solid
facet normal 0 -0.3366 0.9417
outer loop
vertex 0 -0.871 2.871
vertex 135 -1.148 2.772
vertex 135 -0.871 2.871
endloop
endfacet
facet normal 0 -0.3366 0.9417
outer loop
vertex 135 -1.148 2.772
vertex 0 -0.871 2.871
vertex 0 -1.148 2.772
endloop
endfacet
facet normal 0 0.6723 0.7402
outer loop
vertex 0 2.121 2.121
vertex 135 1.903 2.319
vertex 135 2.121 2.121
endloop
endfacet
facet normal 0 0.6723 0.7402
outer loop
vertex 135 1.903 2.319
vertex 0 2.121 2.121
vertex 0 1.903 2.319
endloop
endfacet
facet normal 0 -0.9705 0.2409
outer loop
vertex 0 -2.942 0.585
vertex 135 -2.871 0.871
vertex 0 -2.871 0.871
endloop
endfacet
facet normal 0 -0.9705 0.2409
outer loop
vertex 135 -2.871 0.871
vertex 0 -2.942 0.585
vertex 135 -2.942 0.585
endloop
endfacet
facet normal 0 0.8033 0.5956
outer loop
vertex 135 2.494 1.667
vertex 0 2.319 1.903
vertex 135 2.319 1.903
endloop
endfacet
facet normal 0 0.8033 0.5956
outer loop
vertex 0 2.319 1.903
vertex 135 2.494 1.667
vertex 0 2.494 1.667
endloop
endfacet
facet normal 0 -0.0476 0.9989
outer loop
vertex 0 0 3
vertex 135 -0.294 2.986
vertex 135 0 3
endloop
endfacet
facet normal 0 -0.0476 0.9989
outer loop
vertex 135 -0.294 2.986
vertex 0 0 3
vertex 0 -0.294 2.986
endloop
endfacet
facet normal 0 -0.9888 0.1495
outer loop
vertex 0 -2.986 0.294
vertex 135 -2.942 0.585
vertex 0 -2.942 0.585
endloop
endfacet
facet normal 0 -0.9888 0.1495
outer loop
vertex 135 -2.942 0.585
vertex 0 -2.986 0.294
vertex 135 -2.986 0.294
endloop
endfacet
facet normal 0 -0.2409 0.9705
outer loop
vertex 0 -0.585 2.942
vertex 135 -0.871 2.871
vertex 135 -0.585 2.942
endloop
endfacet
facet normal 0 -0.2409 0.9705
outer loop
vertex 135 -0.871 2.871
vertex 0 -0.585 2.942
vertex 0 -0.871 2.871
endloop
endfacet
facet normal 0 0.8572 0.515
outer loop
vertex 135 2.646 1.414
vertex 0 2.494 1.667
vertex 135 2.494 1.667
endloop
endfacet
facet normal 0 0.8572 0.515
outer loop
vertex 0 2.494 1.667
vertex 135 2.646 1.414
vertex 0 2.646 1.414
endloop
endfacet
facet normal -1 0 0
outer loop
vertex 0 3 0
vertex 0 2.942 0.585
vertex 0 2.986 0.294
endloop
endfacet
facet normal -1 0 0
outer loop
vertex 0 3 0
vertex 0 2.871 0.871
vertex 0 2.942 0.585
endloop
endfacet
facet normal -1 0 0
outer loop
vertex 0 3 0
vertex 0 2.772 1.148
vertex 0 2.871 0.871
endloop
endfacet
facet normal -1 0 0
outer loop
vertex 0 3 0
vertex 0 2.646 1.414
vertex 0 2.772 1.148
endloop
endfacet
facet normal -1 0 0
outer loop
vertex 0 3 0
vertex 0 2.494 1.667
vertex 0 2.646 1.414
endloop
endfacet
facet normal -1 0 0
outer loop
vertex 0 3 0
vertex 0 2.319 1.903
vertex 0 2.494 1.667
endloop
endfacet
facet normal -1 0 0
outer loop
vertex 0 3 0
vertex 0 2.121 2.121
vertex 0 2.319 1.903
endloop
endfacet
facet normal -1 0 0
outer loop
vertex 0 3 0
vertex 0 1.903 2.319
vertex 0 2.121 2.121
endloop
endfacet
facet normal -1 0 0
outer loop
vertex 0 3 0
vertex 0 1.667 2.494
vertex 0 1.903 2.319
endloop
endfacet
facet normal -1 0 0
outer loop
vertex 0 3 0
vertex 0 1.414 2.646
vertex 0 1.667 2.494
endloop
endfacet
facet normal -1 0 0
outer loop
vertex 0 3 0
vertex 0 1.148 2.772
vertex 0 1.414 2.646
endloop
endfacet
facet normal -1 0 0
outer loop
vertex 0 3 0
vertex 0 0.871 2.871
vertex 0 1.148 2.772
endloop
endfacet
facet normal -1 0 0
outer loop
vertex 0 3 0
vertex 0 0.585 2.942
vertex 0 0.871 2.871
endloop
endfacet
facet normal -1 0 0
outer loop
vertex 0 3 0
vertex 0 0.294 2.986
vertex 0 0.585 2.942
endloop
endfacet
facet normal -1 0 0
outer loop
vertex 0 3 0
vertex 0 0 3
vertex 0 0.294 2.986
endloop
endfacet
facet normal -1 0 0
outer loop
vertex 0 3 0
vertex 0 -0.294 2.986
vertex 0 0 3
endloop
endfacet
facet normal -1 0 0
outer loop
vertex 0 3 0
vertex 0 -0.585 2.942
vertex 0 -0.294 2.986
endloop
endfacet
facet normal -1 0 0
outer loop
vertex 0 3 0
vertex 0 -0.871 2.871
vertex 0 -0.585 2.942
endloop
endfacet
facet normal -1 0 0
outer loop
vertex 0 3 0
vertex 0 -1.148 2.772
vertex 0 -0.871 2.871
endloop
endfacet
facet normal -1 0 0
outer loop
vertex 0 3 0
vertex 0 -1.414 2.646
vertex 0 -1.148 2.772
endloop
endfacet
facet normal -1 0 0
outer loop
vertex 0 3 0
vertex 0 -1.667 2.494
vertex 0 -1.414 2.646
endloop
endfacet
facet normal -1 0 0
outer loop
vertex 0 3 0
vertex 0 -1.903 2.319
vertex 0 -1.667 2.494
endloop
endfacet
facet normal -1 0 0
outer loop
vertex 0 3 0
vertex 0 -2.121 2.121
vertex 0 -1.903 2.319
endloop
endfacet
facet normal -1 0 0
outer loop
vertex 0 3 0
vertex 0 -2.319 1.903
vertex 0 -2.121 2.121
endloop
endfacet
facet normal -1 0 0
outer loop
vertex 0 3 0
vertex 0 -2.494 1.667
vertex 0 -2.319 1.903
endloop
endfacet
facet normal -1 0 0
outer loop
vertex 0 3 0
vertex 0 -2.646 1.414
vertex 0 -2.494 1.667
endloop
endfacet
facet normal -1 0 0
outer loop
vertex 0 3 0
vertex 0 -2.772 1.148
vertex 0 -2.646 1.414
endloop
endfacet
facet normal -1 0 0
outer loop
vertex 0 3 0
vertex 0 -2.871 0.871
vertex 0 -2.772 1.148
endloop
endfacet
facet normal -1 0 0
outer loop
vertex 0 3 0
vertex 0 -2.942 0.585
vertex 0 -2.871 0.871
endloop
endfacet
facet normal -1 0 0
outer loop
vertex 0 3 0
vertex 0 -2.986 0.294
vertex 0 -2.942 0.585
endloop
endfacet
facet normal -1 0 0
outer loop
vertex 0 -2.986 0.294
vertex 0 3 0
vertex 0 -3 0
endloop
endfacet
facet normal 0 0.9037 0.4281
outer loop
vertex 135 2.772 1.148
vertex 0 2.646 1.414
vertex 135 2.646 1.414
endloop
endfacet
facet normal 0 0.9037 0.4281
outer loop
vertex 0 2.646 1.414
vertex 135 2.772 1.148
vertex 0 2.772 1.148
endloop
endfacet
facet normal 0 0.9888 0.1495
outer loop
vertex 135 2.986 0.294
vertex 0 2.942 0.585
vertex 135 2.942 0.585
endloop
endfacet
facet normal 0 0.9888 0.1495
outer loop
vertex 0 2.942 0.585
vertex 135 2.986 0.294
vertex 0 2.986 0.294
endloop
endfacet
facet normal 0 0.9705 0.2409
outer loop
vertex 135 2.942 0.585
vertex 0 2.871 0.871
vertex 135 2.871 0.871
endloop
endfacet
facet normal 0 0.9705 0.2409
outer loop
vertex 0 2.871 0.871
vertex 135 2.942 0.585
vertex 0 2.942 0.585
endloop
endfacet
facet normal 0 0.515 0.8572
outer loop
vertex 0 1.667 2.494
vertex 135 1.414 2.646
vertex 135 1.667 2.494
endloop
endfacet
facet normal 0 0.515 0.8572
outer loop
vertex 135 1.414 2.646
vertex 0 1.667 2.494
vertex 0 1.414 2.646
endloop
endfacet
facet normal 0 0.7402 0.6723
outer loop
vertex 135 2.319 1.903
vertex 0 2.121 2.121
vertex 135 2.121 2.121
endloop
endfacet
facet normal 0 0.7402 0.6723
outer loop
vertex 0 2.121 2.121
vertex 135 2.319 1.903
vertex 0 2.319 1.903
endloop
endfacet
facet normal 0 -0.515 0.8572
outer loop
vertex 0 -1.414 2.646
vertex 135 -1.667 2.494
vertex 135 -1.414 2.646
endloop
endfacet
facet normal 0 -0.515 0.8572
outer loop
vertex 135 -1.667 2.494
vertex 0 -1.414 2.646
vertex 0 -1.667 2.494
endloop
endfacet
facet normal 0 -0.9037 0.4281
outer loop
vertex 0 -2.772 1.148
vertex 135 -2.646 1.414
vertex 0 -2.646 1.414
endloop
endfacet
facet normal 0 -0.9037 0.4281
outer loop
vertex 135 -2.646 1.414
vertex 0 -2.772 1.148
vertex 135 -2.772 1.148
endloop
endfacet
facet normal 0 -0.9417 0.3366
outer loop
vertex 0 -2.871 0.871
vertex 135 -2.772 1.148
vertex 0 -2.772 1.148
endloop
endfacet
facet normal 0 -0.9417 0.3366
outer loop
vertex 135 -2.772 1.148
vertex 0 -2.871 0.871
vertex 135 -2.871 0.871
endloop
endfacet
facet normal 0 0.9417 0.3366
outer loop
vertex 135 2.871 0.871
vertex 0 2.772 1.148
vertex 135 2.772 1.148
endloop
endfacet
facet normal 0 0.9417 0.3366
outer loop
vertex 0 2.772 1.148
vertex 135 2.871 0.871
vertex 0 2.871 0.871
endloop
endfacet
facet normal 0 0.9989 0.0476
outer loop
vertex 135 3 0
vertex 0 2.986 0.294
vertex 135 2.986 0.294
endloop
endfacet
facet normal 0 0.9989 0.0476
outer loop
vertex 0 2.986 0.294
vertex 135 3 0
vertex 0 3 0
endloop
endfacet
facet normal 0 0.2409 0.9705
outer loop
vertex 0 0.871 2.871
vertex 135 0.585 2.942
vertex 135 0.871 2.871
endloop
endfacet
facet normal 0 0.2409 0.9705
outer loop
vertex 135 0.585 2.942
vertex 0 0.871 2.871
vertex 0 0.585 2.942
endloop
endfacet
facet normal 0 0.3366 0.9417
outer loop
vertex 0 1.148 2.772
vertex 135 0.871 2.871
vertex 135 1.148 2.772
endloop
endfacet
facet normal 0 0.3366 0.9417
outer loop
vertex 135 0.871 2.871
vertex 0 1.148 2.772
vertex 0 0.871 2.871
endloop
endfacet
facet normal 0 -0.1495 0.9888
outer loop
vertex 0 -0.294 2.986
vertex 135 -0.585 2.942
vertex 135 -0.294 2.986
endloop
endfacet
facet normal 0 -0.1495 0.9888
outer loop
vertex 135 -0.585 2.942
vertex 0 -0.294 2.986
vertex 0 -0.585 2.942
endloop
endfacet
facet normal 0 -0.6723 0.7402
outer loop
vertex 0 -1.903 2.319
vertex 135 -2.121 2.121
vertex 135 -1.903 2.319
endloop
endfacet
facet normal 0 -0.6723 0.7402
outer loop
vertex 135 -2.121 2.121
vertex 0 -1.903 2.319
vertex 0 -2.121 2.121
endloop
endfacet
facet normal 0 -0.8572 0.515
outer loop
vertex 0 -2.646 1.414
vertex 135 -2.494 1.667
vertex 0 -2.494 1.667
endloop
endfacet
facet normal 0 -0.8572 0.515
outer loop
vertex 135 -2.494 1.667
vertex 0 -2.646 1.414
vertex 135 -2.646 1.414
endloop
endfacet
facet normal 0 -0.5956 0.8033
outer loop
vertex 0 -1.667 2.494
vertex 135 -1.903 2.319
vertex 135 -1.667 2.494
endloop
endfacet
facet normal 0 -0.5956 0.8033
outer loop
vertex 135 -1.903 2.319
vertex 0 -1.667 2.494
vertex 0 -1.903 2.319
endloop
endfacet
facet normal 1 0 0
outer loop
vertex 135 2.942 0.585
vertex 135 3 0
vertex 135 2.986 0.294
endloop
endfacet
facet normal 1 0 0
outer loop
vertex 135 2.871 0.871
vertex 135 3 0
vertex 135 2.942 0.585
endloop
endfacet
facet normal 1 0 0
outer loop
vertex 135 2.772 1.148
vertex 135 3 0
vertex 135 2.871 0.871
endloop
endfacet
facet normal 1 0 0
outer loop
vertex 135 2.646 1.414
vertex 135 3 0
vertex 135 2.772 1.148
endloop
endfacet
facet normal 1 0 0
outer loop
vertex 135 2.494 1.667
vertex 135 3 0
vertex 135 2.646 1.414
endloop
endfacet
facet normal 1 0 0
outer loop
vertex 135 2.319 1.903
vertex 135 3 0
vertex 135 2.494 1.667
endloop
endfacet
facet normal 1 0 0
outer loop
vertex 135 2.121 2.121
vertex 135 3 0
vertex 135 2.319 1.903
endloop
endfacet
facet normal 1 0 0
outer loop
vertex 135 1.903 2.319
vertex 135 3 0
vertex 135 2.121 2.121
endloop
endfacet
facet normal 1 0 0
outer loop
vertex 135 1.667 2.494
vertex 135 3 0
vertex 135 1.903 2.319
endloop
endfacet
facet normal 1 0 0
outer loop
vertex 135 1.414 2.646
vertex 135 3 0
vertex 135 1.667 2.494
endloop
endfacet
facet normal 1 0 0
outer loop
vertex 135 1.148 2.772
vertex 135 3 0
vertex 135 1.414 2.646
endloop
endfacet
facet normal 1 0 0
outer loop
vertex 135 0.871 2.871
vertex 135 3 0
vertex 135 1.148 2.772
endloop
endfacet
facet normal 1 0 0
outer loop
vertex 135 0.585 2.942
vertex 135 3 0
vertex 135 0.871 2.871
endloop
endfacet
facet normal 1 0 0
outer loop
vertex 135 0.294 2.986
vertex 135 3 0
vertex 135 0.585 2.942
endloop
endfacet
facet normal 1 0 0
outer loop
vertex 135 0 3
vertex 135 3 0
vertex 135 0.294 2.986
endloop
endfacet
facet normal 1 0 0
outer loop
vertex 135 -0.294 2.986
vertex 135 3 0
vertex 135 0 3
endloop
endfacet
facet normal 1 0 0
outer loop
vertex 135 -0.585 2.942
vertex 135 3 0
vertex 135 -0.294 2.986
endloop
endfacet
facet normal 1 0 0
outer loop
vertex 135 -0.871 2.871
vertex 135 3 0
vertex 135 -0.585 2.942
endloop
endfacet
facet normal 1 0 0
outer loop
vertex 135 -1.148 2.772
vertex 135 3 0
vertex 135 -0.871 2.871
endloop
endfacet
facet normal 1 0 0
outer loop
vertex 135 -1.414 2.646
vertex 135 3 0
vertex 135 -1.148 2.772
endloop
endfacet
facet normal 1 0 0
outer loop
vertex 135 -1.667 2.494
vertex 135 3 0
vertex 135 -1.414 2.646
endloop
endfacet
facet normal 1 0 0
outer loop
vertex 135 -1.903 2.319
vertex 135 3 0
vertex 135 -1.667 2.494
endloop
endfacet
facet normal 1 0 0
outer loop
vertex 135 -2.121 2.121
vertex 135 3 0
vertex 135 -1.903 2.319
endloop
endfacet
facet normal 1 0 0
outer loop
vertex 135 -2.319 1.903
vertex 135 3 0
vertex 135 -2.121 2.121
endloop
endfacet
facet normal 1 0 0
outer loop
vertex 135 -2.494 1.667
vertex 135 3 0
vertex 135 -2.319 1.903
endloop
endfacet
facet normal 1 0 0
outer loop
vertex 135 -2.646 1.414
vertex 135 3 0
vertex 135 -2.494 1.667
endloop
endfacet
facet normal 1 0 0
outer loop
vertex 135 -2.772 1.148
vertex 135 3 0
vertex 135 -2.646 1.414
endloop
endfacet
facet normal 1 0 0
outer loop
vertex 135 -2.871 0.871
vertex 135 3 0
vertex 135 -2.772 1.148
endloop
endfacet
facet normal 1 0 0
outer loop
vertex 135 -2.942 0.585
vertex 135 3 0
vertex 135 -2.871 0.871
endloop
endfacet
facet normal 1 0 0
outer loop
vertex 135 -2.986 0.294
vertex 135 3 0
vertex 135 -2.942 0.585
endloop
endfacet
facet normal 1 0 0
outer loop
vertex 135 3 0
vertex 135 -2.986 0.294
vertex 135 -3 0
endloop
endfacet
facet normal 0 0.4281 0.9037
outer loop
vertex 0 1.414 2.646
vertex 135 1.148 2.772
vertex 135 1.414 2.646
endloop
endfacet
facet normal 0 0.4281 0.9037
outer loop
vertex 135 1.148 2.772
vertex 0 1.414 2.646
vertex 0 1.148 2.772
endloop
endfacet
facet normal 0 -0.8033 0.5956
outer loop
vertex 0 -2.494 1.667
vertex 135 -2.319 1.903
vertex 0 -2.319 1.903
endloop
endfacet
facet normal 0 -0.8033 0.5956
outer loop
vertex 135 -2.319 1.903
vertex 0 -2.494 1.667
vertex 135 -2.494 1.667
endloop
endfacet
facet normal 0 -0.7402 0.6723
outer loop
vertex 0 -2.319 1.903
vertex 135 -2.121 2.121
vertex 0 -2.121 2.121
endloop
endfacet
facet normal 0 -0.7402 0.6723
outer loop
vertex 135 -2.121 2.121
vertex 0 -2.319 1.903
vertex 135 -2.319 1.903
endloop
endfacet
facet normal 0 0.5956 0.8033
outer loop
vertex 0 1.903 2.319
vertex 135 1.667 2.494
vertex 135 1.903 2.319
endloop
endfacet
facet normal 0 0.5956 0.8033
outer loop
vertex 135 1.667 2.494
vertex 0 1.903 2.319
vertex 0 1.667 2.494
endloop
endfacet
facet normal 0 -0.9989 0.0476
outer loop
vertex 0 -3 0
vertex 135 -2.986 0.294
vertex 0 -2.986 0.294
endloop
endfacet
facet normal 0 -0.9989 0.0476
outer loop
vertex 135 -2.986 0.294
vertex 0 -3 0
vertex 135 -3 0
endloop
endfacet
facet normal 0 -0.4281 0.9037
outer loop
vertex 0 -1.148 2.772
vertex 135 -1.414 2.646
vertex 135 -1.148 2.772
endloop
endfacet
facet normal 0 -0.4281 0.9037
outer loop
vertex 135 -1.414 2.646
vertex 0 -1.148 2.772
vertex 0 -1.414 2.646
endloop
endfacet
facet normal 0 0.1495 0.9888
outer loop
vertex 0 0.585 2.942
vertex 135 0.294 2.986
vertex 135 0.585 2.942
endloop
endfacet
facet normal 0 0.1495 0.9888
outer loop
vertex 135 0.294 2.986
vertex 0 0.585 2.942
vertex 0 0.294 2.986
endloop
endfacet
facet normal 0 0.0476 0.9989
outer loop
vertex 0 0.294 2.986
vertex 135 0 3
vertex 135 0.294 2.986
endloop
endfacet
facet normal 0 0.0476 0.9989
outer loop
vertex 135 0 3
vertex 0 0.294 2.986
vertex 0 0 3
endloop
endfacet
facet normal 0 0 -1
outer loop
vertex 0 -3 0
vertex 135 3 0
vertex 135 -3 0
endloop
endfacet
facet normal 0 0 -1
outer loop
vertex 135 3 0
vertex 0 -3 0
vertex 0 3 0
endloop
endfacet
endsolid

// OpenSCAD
// file: extender_params.scad
// FIXME: Needs to be calibrated as explained in
// https://github.com/revarbat/BOSL2/wiki/constants.scad#constant-slop
slop = 0.10;

L = 135;

od = 40;

// Pin
pid = 6; // internal diameter
ped = pid + 4*slop;  // external diameter
pfn = $preview ? 32 : 64;  // $fn

d = 30;
l1 = 6;
l2 = 6;
pitch = 1.5;

// https://en.wikibooks.org/wiki/OpenSCAD_User_Manual/Other_Language_Features#$fa,_$fs_and_$fn

fn = $preview ? 64 : 128;
// main file
include <extender_params.scad>

color("red")
intersection() {
  rotate(90, [0, 1, 0]) cylinder(h = L, r=pid/2, center=false, $fn = pfn);
  translate([0, 0, 1]*L) cube(2*L, center=true);
}
